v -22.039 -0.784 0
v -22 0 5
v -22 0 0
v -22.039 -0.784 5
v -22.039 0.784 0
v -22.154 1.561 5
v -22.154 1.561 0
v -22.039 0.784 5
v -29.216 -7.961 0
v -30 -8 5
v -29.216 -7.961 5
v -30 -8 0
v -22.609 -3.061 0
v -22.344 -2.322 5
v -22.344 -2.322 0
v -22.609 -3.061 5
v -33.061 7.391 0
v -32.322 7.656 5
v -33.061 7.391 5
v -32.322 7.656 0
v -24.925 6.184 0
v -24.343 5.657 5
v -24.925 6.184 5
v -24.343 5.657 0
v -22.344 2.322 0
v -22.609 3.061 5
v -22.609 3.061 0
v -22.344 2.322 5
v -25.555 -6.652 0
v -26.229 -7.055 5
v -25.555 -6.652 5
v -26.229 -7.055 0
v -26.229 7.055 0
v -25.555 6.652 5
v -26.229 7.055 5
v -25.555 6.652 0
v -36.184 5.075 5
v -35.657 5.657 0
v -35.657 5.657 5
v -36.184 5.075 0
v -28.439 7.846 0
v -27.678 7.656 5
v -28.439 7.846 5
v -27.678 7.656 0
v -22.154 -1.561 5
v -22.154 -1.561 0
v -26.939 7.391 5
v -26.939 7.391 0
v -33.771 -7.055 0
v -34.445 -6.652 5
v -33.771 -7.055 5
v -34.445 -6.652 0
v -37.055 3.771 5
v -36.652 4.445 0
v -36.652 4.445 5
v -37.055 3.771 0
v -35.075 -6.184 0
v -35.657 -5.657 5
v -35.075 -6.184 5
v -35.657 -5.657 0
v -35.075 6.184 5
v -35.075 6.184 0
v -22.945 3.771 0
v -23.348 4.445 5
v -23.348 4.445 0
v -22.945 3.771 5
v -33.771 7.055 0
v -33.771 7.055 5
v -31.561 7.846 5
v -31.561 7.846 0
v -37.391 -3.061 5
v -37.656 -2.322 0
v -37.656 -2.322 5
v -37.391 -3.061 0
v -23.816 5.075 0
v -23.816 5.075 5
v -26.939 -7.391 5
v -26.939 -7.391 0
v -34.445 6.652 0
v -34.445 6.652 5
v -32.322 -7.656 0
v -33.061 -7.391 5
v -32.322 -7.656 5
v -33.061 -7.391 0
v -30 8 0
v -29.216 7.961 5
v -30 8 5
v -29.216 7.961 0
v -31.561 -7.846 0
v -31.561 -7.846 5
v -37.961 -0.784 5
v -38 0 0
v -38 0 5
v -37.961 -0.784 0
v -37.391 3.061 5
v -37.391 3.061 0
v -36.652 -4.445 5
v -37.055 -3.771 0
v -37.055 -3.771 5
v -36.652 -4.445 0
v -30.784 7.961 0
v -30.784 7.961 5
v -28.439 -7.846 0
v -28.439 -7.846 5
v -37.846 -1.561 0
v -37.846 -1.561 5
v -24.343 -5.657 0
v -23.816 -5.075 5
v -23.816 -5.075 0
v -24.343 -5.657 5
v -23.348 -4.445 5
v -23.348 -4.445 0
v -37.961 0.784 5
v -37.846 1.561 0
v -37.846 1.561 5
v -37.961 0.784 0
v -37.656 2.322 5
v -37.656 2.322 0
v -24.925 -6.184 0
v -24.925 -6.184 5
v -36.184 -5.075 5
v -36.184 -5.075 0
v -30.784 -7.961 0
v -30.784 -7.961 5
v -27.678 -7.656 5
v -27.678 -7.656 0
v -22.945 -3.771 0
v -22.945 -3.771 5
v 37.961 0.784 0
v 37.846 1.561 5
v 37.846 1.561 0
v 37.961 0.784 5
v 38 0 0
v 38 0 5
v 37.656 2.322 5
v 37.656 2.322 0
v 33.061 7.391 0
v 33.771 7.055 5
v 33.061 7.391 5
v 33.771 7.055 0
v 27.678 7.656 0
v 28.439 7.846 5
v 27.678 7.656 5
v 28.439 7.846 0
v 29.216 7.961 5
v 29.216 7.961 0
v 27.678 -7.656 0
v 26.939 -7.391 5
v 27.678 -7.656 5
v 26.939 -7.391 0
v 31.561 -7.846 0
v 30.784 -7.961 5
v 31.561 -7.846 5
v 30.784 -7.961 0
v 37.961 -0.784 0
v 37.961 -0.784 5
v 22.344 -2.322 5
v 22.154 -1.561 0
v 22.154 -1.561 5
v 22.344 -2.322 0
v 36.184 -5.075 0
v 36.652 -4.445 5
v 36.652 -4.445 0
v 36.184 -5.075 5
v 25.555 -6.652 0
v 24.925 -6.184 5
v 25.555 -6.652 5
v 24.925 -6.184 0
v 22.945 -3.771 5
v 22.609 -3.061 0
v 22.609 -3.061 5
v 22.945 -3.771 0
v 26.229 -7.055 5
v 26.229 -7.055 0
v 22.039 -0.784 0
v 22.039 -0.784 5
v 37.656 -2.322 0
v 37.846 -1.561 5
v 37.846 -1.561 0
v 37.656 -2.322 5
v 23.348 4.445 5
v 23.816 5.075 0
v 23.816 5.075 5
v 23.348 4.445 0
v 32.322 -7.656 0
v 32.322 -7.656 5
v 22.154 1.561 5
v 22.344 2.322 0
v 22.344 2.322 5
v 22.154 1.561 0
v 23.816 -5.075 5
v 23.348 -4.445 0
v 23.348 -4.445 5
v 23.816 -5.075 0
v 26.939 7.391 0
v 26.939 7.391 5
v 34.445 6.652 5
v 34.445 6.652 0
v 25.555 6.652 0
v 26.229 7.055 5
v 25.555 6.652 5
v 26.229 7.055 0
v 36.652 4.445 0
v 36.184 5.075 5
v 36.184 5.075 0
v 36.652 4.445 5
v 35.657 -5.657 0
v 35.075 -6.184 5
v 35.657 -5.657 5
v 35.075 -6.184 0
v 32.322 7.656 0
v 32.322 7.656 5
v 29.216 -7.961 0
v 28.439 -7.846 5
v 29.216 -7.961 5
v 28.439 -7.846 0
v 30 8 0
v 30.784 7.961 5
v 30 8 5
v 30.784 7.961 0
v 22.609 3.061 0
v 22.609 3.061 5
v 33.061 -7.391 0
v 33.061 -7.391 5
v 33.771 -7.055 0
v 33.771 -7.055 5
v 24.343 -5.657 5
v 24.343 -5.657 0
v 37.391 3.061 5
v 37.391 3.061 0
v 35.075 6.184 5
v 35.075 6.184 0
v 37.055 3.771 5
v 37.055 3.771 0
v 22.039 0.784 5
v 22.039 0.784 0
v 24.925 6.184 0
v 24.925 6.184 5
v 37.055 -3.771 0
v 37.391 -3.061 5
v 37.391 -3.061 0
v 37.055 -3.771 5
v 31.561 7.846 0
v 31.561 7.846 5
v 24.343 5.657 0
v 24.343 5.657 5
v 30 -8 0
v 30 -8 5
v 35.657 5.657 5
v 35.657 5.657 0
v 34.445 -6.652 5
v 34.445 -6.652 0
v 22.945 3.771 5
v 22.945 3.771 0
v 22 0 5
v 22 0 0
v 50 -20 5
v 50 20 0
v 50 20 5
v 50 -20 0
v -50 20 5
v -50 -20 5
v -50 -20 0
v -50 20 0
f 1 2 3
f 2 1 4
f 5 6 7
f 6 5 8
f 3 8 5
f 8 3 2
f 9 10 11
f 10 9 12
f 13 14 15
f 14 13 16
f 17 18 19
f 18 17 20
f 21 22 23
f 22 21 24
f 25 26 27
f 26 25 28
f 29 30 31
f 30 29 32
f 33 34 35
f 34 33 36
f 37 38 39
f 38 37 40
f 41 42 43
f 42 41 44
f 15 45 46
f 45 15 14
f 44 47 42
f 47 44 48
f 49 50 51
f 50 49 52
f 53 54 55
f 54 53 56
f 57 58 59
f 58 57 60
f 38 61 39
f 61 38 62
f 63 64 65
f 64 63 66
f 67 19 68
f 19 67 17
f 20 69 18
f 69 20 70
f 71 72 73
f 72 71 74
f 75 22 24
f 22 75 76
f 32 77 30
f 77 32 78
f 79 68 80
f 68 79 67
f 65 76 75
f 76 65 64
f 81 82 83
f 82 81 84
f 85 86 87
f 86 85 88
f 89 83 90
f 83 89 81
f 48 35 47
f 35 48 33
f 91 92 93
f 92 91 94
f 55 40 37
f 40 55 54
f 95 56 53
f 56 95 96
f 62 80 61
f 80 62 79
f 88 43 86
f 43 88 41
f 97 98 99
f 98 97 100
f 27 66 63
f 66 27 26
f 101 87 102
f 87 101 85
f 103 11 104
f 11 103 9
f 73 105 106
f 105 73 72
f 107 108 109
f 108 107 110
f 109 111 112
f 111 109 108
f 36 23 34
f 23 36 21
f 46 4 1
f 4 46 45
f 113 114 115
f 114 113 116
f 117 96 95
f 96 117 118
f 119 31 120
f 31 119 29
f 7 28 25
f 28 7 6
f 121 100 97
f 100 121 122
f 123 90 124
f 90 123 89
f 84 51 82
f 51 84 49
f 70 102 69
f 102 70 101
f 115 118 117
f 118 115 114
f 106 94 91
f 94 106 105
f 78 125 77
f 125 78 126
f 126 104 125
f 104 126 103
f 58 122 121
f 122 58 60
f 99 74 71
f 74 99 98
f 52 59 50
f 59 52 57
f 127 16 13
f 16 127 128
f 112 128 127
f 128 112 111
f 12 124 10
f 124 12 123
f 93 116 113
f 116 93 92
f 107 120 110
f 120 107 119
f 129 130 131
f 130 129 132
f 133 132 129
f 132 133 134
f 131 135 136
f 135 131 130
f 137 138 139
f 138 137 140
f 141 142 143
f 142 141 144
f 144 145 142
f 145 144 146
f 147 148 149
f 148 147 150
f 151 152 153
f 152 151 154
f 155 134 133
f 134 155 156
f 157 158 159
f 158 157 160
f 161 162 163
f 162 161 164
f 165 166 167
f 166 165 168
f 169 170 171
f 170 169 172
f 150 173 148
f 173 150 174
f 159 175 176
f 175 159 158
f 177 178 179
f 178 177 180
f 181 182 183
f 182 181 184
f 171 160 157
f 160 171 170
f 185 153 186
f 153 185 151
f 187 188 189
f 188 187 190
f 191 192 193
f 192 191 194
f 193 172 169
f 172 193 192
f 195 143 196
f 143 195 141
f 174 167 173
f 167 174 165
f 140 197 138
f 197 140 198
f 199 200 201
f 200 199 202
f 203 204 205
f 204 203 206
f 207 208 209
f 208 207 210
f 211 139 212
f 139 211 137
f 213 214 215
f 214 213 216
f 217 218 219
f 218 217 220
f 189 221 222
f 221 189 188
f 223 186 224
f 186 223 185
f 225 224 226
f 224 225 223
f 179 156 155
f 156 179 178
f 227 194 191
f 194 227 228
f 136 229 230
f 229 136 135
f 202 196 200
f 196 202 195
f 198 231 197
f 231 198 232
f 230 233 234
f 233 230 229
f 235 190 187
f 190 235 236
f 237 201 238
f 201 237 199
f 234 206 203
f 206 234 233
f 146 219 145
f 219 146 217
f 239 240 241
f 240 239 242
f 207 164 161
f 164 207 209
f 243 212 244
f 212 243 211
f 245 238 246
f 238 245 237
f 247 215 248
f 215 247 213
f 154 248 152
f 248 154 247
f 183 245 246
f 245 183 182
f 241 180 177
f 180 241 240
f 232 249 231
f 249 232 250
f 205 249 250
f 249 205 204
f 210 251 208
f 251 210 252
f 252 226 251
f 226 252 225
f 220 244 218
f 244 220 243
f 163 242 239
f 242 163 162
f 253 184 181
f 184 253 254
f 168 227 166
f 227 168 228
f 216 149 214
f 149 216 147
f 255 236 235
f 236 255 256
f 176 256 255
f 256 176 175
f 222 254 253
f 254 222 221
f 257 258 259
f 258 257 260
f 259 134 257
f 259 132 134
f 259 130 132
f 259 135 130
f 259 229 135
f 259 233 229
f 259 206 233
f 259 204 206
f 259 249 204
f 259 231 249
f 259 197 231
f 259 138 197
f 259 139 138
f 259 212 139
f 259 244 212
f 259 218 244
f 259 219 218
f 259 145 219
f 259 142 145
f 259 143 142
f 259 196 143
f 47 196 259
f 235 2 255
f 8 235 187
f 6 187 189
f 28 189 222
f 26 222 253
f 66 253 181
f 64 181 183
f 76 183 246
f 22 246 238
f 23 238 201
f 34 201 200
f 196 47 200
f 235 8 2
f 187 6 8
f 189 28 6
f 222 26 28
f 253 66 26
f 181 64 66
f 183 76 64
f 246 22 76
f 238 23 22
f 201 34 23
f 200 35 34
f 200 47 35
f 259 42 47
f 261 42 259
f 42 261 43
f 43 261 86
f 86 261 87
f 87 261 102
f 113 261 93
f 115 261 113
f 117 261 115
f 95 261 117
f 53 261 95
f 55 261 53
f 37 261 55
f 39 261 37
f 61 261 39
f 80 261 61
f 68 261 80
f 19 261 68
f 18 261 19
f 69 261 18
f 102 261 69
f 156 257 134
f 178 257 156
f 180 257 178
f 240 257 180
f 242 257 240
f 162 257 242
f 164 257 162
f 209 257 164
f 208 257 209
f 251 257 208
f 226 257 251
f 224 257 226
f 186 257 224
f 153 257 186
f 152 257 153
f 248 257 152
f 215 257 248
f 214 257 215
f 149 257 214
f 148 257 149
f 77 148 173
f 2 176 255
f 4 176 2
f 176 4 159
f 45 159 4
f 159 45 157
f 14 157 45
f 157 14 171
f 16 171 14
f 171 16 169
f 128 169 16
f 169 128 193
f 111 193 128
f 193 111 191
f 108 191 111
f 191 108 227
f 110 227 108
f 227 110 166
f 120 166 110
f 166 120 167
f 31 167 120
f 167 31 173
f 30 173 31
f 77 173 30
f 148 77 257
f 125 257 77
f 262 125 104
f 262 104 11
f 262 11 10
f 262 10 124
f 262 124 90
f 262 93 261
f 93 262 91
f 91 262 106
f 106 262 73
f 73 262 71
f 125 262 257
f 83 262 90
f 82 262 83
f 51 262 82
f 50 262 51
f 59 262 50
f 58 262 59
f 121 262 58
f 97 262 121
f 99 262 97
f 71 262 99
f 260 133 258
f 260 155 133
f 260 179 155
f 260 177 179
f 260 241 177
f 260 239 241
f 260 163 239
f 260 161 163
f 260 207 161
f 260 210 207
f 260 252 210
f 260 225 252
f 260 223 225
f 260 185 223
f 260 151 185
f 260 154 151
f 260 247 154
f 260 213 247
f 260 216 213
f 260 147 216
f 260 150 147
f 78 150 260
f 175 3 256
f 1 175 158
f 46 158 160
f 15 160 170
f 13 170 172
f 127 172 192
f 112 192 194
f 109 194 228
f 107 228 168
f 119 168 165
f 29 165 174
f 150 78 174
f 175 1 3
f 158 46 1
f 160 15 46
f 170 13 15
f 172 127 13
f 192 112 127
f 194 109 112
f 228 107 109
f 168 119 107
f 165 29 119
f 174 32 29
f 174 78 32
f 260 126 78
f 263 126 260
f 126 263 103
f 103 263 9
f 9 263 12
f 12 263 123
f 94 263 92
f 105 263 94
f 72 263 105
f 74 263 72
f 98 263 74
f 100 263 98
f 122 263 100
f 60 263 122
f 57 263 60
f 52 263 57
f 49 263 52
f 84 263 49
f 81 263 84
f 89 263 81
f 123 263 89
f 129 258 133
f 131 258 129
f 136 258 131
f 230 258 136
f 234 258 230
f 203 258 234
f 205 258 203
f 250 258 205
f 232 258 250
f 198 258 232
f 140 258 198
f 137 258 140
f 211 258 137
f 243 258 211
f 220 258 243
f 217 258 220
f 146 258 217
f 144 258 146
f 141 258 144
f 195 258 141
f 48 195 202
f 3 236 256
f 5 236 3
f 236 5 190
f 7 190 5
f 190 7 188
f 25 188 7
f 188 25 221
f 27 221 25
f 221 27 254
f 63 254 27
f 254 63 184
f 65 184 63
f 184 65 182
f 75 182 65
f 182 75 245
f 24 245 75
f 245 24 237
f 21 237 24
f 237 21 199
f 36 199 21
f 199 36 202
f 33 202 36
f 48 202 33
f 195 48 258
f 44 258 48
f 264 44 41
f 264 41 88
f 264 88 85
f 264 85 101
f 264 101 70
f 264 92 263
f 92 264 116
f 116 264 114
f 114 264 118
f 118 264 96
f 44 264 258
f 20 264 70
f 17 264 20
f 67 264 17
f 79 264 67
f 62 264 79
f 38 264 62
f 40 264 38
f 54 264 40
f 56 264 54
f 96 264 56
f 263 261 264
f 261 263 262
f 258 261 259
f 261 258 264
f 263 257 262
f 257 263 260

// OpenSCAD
// Gold reference for vision-sketch.png: 100×40×5mm plate, two ⌀16 holes.
// Hole positions are NOT dimensioned in the sketch; the drawing shows them
// vertically centered, symmetric, ~20mm inset from each end. Position variance
// costs little IoU (each hole ≈5% of plate volume).
$fn = 64;

length = 100;
width = 40;
thickness = 5;
hole_d = 16;
hole_inset = 20;

difference() {
  translate([-length / 2, -width / 2, 0]) cube([length, width, thickness]);
  for (x = [-length / 2 + hole_inset, length / 2 - hole_inset])
    translate([x, 0, -1]) cylinder(d = hole_d, h = thickness + 2);
}
